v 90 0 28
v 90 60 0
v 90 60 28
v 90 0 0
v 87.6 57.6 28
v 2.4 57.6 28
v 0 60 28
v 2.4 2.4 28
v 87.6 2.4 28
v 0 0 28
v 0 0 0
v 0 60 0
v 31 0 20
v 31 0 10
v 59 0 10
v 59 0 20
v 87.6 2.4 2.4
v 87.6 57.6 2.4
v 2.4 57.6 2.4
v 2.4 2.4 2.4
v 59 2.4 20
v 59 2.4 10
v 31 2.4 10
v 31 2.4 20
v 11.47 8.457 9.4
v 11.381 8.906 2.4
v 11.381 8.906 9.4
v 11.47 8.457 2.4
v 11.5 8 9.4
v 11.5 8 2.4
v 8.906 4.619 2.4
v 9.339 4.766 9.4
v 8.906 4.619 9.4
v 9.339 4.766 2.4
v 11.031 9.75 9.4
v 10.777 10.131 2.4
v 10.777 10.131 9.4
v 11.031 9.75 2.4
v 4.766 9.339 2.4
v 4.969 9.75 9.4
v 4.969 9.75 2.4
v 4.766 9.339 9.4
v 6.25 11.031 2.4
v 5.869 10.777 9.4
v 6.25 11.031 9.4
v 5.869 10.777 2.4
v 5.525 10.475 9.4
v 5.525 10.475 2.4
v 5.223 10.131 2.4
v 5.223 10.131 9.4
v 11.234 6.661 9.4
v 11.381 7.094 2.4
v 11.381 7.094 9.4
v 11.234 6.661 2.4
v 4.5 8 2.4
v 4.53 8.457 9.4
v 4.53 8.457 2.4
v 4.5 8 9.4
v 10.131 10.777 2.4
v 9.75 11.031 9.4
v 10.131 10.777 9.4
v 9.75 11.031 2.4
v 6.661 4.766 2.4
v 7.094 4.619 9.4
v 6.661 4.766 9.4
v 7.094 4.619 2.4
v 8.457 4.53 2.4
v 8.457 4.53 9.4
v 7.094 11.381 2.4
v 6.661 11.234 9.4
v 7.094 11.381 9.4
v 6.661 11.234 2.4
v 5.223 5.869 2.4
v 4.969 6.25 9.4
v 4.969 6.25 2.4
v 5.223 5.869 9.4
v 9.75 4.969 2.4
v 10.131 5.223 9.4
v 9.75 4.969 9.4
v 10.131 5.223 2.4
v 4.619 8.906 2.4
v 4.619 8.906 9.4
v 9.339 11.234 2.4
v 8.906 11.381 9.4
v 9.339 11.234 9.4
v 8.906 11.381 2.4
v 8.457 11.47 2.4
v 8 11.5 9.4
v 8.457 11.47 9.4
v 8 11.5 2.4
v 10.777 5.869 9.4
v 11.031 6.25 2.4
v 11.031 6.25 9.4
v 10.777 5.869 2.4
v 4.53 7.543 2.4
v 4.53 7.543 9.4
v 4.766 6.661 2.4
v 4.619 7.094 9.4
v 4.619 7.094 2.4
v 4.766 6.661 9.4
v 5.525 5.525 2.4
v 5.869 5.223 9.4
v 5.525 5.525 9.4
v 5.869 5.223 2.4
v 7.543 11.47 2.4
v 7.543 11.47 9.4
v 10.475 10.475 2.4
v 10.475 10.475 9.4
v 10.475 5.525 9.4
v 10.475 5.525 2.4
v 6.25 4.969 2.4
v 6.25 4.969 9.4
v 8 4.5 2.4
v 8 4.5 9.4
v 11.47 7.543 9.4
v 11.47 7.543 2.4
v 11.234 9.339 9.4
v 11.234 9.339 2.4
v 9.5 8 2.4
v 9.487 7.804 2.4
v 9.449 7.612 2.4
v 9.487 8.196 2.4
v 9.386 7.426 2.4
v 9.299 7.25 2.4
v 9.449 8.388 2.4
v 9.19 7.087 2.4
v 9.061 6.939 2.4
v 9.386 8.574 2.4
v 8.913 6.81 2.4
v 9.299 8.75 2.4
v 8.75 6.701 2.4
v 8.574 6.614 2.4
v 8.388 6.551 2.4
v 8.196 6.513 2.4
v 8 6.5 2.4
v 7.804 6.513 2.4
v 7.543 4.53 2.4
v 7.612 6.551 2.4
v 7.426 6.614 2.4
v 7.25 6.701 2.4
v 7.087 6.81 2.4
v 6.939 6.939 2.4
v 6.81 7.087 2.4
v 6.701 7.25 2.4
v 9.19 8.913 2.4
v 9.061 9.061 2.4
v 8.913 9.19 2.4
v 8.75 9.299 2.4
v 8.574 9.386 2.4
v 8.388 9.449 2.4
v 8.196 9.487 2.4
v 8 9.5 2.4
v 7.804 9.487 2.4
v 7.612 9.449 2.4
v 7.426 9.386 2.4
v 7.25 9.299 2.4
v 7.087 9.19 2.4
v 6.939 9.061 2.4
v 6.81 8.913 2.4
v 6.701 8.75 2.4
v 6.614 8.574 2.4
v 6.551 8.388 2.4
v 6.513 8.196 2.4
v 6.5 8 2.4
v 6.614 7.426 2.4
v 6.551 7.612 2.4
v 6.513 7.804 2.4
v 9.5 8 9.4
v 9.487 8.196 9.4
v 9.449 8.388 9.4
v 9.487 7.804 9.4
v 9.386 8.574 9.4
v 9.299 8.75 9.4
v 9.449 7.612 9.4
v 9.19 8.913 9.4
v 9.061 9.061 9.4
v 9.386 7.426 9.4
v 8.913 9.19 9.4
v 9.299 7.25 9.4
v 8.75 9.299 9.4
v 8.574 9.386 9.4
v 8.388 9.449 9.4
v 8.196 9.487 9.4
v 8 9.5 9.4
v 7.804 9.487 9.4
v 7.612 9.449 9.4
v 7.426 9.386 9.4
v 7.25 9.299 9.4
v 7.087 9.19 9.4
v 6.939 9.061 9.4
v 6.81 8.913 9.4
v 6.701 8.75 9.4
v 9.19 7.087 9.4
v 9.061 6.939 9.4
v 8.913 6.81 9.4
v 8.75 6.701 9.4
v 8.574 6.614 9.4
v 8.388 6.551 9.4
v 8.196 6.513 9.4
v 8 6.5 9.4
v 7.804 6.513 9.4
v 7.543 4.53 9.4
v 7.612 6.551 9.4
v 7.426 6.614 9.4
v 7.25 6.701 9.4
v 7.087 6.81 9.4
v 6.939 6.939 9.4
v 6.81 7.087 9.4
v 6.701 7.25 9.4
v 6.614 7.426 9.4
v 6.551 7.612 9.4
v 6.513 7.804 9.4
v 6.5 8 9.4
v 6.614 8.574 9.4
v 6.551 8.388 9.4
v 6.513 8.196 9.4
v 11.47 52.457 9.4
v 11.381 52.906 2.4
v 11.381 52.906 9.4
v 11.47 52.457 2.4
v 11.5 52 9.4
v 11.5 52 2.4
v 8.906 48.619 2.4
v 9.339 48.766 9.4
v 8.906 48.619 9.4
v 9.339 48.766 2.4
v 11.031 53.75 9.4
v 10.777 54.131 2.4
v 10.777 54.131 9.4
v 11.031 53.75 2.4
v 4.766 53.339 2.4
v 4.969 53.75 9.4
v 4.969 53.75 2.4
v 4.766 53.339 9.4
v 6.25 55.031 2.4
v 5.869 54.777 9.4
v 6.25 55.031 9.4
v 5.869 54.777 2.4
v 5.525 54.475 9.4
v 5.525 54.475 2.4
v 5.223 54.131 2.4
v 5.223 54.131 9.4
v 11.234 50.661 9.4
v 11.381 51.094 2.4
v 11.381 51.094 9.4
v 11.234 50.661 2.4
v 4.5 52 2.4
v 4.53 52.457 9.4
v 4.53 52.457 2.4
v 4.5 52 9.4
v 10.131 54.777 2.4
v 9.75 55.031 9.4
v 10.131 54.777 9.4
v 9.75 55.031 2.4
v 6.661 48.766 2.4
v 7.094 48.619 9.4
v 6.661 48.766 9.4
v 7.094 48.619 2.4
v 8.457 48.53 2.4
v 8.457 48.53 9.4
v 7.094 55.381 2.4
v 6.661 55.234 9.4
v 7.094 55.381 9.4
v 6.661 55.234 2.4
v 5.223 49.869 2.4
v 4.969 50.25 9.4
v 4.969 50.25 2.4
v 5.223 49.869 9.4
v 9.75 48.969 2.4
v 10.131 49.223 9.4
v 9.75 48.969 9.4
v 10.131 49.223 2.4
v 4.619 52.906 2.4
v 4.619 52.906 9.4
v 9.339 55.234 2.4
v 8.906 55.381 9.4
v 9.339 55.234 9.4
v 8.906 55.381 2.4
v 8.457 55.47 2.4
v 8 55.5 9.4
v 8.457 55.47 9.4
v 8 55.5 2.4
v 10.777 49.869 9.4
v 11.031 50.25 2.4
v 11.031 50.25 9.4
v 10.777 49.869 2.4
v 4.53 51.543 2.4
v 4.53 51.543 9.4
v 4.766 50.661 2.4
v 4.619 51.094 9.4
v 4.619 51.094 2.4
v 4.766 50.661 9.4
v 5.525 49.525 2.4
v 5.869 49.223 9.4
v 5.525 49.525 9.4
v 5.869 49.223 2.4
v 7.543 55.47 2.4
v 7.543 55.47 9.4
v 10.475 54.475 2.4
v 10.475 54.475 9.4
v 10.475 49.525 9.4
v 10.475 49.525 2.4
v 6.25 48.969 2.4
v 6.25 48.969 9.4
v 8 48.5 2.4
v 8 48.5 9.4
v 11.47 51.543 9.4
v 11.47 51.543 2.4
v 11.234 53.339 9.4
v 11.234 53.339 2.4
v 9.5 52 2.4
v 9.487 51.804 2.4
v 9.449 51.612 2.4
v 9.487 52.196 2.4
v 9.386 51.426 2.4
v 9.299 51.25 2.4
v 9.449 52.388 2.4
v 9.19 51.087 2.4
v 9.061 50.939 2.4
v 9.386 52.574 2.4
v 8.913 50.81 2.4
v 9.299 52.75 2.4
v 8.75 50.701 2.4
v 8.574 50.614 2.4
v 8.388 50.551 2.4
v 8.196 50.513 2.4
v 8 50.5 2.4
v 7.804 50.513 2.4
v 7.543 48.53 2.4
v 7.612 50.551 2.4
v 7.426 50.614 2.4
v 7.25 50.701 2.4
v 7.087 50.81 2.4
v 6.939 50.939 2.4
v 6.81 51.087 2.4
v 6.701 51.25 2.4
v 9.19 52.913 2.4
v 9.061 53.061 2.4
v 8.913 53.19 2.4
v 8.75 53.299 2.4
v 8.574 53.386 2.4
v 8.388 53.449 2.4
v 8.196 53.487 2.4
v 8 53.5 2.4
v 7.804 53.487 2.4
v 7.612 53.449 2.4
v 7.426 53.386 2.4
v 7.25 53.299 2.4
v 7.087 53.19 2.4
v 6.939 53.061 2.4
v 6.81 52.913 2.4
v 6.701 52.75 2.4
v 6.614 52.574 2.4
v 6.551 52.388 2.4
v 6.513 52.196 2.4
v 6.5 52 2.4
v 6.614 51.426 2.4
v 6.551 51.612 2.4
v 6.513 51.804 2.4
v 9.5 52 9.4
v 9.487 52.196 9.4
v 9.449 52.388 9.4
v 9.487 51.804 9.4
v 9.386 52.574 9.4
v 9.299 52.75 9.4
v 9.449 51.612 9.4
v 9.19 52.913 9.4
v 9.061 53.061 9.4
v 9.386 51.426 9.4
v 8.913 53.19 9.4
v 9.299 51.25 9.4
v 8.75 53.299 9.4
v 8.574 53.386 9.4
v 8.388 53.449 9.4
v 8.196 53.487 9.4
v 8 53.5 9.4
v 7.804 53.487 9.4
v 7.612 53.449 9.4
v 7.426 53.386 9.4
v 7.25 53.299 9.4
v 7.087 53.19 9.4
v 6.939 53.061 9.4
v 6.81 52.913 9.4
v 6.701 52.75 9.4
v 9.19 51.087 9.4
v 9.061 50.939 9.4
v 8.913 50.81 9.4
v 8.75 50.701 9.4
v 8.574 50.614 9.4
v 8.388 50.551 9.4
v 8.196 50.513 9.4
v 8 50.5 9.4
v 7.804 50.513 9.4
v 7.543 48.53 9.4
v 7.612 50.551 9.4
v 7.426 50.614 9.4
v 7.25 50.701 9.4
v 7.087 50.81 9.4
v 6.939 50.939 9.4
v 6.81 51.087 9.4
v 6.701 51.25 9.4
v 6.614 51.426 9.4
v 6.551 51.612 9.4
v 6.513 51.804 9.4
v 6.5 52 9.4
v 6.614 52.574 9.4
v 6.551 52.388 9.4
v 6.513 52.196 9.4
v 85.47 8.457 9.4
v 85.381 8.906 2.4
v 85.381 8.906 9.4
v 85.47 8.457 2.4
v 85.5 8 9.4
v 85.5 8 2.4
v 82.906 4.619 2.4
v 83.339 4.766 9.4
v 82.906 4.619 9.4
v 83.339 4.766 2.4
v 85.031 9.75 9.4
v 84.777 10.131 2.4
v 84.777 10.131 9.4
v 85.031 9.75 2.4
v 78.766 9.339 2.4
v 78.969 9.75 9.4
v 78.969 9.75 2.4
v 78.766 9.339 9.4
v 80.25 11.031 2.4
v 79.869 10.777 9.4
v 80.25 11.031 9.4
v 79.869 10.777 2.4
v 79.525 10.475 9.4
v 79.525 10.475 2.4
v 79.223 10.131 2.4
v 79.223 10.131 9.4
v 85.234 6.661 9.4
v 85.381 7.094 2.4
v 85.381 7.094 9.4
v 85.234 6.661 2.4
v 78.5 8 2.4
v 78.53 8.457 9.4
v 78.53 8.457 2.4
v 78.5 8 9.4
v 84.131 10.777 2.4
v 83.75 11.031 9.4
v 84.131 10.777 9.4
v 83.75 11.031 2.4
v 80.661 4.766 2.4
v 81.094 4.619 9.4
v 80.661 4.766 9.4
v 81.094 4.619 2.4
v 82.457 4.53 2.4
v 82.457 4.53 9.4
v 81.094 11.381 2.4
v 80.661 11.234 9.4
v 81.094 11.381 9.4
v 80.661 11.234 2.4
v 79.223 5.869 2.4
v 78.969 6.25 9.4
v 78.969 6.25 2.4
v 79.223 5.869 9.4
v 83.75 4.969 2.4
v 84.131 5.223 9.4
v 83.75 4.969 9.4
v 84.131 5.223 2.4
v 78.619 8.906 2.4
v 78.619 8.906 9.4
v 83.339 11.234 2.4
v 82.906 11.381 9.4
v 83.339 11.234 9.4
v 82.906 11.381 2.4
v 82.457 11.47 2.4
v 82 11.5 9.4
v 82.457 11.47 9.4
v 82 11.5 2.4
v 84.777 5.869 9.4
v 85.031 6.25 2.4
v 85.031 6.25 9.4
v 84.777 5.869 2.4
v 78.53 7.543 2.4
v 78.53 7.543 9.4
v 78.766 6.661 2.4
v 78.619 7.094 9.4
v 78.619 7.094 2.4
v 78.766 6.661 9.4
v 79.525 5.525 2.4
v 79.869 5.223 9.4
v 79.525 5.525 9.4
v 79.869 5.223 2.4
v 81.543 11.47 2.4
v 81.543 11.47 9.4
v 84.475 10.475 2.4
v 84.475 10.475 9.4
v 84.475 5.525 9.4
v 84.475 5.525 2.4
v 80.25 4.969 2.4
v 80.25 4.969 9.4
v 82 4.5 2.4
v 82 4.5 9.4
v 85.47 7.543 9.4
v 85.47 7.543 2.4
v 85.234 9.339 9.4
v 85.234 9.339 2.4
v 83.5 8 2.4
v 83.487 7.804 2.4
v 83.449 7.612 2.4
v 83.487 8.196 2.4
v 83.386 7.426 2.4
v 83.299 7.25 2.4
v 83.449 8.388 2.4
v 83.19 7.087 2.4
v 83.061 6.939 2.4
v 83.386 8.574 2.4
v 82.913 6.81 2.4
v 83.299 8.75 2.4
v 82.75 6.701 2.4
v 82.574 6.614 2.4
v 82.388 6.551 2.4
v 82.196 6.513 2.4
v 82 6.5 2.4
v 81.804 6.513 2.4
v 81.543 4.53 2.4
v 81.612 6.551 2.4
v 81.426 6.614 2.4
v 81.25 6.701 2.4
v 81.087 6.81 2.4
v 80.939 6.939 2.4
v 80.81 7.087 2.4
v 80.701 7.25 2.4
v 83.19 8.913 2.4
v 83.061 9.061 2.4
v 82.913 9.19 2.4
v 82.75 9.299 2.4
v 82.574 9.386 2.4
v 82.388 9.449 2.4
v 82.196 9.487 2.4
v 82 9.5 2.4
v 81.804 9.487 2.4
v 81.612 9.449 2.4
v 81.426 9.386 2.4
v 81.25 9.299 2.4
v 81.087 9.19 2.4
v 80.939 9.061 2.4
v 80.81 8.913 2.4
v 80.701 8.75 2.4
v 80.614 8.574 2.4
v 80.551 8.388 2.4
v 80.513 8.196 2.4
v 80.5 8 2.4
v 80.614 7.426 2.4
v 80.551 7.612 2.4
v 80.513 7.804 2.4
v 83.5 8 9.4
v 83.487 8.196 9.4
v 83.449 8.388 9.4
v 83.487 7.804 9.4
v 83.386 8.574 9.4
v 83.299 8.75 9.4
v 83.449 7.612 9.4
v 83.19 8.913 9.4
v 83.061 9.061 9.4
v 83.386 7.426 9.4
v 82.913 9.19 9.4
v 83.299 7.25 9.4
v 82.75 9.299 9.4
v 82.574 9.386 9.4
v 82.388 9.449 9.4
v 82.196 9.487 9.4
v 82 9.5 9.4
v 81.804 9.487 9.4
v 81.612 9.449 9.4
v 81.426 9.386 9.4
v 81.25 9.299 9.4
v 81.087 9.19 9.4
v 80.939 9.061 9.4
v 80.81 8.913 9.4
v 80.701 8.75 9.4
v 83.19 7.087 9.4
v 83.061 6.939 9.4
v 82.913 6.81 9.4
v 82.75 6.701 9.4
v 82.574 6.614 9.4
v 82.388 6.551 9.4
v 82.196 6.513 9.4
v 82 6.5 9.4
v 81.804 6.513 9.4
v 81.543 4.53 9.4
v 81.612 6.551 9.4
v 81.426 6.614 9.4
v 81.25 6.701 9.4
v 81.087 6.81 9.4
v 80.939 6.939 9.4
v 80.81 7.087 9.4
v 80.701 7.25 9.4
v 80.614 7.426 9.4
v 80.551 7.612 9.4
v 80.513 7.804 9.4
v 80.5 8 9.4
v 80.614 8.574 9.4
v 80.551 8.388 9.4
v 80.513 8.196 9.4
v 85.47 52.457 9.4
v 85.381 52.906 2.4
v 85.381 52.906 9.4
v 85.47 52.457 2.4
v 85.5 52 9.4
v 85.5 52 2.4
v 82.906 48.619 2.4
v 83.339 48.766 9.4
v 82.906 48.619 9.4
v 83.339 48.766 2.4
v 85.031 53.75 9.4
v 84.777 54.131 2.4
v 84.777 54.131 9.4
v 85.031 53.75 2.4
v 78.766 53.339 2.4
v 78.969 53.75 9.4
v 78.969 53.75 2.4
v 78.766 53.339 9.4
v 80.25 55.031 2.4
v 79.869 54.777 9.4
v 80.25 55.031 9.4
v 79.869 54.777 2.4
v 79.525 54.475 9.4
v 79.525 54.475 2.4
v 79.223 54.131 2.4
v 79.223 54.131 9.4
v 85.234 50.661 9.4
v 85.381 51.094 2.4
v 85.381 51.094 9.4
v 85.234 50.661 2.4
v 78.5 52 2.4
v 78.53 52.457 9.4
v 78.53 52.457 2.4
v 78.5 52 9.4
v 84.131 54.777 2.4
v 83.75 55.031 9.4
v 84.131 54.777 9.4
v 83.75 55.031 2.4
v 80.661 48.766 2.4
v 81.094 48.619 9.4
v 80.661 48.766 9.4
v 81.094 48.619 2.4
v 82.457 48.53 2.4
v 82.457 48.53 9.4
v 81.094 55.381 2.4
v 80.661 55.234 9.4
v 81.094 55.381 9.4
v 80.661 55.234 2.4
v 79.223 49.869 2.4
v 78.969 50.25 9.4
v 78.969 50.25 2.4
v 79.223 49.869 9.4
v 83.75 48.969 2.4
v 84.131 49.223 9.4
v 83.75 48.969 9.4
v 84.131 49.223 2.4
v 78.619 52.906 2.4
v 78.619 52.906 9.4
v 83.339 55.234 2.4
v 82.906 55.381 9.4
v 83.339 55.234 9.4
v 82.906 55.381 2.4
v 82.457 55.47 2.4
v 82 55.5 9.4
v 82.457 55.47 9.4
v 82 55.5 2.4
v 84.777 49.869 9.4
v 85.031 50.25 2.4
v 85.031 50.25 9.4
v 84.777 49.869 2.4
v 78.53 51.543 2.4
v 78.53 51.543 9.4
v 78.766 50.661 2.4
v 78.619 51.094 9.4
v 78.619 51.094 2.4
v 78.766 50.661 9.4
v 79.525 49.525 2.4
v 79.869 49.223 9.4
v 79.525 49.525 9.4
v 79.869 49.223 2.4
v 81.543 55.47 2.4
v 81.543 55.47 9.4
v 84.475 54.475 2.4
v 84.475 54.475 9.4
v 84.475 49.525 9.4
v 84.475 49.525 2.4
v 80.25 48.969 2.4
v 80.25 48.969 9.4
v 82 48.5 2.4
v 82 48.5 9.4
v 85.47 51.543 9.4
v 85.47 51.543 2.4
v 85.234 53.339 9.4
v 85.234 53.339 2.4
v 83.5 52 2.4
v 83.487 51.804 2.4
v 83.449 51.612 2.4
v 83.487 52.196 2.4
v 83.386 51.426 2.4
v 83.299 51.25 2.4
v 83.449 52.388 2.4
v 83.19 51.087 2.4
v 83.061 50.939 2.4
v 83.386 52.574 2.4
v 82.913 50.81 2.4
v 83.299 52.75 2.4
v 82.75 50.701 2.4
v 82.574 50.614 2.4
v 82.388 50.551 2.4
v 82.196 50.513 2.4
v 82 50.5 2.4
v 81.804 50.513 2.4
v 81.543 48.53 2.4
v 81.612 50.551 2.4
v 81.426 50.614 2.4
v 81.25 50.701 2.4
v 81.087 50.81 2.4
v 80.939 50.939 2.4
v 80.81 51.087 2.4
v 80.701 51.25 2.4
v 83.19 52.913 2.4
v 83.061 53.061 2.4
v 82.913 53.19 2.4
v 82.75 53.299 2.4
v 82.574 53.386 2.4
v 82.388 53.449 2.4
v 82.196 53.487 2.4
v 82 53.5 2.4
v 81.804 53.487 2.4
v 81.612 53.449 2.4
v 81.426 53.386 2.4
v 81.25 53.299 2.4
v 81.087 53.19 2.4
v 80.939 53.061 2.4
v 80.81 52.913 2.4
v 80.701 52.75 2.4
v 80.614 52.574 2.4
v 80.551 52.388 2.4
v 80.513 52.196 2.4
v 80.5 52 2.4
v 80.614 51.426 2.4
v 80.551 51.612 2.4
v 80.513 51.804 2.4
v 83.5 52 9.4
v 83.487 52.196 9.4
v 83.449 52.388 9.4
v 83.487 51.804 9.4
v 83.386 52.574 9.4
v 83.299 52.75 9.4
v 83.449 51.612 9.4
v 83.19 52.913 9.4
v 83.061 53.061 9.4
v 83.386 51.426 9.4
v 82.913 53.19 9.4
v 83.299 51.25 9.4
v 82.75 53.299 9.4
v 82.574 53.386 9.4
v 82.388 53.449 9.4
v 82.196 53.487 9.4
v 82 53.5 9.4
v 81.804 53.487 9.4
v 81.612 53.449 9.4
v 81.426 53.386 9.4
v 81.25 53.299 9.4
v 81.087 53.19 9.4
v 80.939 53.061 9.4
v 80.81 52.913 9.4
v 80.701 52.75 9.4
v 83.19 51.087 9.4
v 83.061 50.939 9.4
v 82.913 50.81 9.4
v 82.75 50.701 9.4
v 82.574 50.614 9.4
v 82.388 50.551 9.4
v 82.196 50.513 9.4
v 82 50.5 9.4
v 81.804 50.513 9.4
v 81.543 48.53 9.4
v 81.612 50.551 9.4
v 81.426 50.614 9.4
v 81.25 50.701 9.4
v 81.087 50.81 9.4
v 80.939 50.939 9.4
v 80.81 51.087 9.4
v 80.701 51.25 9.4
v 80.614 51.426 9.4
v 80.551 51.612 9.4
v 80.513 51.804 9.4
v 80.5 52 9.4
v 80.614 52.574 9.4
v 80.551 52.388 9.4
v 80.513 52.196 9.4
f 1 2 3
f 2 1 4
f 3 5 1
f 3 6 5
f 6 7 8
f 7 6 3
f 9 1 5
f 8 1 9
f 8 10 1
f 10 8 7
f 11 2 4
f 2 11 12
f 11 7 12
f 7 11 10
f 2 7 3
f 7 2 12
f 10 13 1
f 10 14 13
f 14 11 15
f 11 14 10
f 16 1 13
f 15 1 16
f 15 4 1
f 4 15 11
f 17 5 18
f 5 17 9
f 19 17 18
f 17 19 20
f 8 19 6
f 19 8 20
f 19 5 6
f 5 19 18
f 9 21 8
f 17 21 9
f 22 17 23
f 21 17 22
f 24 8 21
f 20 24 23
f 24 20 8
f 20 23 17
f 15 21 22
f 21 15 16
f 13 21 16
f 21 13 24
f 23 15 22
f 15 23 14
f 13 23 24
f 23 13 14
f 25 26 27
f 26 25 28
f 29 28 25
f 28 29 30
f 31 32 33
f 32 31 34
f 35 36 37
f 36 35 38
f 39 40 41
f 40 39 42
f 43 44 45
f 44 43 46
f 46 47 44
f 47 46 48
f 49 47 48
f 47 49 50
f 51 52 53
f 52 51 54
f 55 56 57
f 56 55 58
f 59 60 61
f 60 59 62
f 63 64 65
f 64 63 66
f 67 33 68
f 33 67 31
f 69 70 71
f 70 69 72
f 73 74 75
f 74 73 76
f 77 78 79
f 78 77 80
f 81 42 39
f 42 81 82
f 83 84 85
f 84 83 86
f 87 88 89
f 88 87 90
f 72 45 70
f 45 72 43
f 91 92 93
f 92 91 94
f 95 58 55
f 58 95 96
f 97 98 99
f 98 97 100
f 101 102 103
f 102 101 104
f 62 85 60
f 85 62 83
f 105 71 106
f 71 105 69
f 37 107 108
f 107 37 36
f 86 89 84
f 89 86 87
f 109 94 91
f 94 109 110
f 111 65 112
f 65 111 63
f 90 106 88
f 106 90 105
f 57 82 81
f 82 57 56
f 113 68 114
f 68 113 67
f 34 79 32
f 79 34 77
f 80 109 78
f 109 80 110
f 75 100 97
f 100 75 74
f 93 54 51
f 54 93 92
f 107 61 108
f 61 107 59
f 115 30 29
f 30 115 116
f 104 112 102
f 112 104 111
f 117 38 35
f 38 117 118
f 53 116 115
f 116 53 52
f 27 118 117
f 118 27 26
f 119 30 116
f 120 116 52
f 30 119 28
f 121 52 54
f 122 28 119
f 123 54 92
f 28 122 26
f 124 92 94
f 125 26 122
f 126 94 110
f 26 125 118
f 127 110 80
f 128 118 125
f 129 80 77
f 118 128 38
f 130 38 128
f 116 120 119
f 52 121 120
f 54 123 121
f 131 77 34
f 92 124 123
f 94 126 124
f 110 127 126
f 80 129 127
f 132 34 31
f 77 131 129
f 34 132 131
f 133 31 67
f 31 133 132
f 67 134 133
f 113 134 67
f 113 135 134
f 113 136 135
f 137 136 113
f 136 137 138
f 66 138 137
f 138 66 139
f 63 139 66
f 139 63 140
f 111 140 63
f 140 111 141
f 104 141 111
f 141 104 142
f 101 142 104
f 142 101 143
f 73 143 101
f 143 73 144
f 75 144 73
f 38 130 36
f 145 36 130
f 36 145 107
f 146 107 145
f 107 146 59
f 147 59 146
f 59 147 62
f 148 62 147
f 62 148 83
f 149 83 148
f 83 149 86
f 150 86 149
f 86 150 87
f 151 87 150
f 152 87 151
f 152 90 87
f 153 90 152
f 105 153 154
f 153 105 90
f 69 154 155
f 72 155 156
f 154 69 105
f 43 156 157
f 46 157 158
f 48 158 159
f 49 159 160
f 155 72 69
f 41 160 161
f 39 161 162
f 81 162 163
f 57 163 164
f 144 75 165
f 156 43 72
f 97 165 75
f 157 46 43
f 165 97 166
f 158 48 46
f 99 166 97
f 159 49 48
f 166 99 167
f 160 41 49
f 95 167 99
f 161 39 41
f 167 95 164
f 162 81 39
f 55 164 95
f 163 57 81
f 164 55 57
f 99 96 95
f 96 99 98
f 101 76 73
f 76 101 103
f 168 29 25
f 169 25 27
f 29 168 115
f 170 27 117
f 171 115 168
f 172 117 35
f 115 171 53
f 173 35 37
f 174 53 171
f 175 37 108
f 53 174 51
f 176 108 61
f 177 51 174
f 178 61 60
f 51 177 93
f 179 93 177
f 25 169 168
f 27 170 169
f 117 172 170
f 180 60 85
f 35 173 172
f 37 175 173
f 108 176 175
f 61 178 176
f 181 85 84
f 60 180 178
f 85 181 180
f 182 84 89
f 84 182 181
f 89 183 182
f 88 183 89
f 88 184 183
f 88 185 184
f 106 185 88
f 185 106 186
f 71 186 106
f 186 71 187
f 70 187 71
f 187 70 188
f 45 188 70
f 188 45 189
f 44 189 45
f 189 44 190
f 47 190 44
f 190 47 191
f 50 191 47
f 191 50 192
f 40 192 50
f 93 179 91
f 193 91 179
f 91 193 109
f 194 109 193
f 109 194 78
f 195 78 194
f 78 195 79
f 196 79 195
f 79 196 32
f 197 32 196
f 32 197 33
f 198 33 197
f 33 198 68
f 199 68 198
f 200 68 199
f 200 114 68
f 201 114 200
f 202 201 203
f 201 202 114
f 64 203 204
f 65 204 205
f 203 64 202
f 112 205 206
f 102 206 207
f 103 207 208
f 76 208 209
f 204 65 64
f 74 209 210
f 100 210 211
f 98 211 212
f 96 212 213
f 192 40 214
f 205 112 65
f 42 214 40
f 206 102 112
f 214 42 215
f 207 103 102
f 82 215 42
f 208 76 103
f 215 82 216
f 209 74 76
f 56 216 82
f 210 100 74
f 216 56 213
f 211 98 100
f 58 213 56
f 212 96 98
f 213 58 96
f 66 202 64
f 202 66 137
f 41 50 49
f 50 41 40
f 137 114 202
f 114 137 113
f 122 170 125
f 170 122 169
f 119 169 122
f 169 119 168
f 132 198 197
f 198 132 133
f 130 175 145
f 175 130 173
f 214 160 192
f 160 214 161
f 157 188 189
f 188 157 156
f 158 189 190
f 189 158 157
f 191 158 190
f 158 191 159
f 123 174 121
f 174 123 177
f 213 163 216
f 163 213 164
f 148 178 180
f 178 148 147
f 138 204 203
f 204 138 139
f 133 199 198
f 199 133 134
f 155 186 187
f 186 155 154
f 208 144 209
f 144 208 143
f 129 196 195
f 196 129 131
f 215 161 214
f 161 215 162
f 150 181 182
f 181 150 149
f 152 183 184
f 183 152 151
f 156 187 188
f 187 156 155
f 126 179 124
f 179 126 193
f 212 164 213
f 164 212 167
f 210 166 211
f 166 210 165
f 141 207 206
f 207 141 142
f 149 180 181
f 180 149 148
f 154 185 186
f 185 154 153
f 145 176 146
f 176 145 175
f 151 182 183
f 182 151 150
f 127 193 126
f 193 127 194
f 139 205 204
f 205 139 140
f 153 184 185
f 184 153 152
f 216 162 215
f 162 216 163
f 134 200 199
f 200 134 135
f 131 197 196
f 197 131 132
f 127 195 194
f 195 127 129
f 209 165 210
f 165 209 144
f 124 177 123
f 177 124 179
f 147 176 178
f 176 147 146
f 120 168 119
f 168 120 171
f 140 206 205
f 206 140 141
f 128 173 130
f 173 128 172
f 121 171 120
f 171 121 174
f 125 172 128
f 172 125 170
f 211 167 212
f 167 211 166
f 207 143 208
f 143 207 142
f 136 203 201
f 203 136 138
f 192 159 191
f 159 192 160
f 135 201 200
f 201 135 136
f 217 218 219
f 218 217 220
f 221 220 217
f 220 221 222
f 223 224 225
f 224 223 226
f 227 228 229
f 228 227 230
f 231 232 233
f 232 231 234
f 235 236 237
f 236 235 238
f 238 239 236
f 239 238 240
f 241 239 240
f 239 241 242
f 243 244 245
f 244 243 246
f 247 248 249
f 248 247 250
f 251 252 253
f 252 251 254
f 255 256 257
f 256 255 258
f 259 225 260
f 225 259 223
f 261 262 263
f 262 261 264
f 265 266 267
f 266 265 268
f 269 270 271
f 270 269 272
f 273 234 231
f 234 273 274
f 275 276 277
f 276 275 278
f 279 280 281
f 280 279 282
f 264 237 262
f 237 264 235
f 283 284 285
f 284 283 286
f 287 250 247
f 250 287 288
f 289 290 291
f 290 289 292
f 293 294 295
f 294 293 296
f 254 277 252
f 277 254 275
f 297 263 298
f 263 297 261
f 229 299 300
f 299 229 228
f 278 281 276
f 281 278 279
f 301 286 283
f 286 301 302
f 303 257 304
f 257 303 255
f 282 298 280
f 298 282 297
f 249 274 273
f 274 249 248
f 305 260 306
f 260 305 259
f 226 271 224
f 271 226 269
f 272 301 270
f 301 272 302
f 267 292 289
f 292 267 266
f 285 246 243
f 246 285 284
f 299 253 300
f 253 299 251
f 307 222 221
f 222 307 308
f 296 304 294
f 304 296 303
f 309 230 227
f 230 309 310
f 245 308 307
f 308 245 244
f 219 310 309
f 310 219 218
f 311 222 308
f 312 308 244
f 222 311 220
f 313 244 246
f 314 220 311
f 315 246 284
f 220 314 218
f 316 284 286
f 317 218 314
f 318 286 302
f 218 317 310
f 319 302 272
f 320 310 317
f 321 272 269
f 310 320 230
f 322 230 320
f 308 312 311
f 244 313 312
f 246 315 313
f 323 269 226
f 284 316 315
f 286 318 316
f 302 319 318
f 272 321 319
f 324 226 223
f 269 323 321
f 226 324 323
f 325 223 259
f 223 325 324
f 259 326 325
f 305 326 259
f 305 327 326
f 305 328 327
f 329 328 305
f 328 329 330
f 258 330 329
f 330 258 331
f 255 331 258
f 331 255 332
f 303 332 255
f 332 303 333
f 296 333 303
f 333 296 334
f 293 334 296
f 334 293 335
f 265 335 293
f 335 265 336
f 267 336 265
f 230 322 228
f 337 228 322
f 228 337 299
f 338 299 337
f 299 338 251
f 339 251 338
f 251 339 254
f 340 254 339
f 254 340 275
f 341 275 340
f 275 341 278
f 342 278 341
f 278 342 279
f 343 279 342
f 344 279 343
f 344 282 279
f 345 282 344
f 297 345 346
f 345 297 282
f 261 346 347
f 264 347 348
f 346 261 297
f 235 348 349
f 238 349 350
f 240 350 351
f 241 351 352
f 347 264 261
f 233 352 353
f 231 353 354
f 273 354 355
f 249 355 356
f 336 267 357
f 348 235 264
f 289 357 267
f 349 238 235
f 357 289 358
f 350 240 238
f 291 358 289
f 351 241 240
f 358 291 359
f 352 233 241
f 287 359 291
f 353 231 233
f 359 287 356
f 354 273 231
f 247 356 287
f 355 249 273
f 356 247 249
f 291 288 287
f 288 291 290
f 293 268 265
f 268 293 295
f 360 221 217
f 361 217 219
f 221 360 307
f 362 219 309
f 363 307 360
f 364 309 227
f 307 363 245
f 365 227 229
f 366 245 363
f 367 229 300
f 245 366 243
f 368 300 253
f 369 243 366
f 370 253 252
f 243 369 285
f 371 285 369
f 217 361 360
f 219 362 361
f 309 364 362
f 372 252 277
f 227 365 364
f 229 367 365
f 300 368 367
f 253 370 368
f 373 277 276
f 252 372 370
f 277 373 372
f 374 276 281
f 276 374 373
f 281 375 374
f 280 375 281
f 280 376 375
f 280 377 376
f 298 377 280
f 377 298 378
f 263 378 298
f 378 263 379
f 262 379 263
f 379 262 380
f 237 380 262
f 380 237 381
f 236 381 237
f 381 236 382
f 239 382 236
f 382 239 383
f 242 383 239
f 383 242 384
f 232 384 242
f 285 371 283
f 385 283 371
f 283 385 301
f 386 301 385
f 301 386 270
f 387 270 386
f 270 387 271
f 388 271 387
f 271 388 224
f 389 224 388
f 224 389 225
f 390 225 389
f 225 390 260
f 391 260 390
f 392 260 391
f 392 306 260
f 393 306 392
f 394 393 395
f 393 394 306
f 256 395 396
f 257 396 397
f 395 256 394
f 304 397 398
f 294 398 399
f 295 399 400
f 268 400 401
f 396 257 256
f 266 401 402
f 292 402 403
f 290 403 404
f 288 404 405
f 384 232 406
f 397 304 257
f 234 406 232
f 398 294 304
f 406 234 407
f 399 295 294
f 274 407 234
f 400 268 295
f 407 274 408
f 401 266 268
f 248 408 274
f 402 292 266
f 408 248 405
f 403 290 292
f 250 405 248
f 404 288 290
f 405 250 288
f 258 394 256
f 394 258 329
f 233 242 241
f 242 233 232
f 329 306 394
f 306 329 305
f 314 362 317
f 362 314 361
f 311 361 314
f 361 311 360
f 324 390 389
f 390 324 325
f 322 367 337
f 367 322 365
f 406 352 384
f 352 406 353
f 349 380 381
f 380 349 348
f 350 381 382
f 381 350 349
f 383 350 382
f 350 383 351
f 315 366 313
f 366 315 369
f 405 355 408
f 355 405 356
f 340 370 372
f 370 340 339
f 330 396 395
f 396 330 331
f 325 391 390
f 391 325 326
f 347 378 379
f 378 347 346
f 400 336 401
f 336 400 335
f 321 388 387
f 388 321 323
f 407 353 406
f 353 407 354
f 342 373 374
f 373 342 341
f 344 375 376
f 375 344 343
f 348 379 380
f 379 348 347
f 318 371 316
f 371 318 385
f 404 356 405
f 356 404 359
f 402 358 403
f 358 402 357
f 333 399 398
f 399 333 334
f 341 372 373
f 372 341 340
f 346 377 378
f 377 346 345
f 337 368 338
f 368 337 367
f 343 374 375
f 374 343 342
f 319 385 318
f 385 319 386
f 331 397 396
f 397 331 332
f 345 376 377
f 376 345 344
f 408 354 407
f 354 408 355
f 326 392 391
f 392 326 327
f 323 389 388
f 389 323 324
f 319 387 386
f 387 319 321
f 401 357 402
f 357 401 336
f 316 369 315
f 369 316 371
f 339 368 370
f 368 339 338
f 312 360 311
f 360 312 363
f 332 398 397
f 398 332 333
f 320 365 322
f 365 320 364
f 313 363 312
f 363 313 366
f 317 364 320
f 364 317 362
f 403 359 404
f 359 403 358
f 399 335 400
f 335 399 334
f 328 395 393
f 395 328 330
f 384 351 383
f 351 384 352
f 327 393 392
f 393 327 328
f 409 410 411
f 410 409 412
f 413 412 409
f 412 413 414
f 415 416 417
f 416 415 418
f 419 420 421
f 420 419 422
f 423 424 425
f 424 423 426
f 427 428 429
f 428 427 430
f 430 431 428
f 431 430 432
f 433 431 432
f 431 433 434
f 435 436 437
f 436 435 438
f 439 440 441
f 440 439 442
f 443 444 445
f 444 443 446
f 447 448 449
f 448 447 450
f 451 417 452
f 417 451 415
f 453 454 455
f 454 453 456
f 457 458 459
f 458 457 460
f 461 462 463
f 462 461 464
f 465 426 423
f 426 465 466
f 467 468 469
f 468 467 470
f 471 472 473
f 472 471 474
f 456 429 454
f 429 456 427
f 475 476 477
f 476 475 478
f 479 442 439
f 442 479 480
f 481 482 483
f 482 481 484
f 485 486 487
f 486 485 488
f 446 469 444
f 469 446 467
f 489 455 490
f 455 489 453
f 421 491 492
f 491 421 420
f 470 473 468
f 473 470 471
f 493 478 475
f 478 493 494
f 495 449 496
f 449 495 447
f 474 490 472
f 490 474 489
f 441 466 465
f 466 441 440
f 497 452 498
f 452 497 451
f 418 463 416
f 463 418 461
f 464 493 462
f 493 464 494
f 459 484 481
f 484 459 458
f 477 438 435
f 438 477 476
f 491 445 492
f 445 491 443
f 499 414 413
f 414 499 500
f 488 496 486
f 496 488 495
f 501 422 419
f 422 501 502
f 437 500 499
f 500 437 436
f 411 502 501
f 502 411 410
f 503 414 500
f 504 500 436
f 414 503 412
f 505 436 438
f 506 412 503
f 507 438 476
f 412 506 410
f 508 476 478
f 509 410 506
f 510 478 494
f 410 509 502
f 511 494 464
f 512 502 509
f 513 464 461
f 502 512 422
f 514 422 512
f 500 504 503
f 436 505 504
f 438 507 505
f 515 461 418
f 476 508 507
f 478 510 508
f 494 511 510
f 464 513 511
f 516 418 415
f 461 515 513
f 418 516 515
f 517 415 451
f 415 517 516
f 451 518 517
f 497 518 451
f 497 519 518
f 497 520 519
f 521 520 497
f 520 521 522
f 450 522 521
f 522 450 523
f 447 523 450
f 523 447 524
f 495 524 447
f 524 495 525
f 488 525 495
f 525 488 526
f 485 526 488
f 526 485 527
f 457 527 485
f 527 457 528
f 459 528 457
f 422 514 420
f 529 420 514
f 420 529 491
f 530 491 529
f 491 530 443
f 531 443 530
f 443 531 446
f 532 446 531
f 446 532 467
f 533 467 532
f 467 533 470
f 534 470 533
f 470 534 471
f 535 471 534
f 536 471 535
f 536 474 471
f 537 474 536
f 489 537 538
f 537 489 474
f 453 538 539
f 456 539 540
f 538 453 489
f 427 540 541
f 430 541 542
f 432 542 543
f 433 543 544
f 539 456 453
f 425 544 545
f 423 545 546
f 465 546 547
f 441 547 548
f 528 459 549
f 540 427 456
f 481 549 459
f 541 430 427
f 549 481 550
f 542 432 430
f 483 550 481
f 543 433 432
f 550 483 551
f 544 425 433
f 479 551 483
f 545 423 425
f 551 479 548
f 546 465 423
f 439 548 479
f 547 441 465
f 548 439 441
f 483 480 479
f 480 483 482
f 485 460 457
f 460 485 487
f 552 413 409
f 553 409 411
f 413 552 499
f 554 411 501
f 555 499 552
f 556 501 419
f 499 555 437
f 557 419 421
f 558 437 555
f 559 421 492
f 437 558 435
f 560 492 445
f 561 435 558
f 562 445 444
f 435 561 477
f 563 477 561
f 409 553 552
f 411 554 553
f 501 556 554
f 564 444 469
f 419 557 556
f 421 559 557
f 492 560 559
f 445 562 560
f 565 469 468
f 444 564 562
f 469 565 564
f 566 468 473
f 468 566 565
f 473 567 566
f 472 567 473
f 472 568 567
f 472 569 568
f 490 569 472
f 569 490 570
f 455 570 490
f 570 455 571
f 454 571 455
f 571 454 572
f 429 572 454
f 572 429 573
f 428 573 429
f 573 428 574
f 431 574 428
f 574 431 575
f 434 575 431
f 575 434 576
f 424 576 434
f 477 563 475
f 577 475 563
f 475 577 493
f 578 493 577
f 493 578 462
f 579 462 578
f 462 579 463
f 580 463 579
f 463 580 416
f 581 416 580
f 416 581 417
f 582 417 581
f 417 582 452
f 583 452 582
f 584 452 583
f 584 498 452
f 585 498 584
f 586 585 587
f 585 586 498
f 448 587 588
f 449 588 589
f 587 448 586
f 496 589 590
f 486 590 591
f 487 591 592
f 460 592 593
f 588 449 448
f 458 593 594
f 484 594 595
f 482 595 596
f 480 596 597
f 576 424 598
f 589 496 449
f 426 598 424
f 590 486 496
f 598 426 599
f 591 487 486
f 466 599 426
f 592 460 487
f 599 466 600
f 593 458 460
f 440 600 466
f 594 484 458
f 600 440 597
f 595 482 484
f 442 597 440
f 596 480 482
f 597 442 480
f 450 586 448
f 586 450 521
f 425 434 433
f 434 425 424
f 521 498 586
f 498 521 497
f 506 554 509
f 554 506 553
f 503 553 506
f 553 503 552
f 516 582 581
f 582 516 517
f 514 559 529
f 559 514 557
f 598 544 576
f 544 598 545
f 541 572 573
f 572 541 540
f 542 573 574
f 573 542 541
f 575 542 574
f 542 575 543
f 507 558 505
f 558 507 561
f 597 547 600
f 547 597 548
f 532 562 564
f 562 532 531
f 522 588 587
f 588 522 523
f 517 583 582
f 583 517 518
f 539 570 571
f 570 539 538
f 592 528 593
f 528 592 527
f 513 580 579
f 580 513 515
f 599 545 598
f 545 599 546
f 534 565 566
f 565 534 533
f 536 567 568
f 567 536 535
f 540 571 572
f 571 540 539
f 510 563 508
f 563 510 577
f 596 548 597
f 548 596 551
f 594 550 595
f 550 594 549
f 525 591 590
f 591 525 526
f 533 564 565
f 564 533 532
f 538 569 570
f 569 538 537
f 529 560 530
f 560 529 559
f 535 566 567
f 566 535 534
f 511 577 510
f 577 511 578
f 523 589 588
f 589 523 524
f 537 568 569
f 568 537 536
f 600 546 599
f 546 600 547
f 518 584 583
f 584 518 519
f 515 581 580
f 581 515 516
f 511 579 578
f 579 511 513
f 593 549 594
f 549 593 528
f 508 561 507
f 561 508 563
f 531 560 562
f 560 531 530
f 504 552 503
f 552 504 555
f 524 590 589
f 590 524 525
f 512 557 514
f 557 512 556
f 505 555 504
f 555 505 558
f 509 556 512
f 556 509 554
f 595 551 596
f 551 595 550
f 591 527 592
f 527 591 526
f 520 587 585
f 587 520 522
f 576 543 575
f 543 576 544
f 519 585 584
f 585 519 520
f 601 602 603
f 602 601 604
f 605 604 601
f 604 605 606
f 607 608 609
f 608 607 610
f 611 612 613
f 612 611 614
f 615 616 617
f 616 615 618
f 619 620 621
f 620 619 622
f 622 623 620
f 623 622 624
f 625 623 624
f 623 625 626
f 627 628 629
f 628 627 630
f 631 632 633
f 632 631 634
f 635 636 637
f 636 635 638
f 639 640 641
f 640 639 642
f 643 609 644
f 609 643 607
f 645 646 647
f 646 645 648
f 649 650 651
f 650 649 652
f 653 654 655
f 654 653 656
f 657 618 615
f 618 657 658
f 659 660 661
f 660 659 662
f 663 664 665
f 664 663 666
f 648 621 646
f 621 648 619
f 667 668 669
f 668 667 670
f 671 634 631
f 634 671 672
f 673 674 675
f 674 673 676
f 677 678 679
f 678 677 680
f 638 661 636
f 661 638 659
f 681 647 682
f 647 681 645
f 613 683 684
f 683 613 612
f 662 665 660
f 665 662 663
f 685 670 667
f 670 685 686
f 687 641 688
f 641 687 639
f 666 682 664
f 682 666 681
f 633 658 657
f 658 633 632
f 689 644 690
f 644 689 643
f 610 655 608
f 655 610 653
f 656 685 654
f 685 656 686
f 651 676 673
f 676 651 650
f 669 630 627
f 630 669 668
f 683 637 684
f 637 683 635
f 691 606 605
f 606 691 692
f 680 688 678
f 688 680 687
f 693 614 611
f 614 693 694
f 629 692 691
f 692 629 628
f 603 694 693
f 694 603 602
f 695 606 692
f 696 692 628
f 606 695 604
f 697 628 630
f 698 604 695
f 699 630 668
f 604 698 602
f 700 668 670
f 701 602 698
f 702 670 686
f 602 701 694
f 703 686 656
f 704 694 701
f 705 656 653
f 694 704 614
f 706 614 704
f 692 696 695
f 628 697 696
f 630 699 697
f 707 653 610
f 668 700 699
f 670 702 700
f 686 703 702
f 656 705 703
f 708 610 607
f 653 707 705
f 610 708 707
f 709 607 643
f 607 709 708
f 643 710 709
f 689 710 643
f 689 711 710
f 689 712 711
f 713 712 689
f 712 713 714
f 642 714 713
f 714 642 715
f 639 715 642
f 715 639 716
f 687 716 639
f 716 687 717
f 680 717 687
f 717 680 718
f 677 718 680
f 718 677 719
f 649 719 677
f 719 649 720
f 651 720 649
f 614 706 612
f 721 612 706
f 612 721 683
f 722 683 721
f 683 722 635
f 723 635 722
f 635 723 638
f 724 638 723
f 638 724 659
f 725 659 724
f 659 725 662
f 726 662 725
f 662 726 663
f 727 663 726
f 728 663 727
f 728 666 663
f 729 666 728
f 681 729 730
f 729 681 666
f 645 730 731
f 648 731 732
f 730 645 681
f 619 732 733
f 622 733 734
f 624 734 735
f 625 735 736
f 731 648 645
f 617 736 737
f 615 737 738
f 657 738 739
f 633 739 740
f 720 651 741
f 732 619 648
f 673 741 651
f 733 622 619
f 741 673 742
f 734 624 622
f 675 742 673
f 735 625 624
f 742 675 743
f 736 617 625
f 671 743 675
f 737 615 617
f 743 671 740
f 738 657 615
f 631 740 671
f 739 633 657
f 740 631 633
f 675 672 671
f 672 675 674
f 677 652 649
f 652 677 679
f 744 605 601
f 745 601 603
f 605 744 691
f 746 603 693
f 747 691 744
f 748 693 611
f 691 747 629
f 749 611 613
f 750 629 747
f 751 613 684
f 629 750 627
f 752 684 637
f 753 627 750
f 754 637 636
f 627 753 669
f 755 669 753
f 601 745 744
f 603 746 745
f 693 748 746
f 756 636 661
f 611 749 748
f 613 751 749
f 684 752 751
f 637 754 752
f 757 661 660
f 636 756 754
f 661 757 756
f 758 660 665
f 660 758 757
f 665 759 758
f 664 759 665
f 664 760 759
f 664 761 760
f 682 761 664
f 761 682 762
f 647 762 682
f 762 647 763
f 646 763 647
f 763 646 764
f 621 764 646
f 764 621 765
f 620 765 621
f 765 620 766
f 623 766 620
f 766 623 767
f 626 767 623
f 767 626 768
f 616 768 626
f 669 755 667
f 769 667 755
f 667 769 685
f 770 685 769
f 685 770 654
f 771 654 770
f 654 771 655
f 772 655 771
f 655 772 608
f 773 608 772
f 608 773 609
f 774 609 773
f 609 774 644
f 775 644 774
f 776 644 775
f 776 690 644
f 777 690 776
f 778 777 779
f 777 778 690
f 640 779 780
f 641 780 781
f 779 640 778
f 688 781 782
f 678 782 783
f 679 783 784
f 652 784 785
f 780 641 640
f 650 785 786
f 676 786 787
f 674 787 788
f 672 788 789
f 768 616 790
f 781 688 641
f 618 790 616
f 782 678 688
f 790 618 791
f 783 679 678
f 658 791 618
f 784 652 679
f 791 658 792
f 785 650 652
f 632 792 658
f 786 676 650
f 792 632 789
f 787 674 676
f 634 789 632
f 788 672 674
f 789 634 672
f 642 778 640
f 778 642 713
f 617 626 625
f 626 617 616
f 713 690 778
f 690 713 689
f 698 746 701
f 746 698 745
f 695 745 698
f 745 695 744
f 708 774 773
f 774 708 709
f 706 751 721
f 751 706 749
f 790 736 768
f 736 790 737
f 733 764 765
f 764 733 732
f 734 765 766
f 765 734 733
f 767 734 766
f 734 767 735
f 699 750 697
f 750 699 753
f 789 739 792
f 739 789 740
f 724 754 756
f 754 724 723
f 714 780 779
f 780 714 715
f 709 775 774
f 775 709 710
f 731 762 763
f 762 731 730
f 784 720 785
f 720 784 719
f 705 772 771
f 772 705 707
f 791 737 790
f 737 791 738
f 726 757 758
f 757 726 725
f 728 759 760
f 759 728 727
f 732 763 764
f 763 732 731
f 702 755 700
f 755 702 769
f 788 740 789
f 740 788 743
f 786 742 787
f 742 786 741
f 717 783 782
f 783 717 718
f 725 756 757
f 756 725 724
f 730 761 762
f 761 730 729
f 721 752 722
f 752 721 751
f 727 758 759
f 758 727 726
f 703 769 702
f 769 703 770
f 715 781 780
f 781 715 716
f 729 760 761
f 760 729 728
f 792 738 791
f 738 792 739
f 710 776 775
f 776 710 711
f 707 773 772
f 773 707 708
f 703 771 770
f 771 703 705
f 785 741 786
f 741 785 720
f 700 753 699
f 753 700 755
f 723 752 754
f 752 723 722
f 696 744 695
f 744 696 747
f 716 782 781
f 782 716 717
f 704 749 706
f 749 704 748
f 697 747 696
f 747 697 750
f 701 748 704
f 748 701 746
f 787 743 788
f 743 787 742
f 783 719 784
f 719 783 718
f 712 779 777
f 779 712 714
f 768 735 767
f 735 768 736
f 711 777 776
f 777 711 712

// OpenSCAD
// Voice Controlled Home Automation — parametric electronics enclosure base.
$fn=48;
L=90; W=60; H=28; wall=2.4;
difference() {
  cube([L,W,H]);
  translate([wall,wall,wall]) cube([L-2*wall,W-2*wall,H]);
  translate([L/2-14,-1,10]) cube([28,wall+2,10]);
}
for(x=[8,L-8], y=[8,W-8]) translate([x,y,wall]) difference() { cylinder(h=7,d=7); cylinder(h=8,d=3); }
